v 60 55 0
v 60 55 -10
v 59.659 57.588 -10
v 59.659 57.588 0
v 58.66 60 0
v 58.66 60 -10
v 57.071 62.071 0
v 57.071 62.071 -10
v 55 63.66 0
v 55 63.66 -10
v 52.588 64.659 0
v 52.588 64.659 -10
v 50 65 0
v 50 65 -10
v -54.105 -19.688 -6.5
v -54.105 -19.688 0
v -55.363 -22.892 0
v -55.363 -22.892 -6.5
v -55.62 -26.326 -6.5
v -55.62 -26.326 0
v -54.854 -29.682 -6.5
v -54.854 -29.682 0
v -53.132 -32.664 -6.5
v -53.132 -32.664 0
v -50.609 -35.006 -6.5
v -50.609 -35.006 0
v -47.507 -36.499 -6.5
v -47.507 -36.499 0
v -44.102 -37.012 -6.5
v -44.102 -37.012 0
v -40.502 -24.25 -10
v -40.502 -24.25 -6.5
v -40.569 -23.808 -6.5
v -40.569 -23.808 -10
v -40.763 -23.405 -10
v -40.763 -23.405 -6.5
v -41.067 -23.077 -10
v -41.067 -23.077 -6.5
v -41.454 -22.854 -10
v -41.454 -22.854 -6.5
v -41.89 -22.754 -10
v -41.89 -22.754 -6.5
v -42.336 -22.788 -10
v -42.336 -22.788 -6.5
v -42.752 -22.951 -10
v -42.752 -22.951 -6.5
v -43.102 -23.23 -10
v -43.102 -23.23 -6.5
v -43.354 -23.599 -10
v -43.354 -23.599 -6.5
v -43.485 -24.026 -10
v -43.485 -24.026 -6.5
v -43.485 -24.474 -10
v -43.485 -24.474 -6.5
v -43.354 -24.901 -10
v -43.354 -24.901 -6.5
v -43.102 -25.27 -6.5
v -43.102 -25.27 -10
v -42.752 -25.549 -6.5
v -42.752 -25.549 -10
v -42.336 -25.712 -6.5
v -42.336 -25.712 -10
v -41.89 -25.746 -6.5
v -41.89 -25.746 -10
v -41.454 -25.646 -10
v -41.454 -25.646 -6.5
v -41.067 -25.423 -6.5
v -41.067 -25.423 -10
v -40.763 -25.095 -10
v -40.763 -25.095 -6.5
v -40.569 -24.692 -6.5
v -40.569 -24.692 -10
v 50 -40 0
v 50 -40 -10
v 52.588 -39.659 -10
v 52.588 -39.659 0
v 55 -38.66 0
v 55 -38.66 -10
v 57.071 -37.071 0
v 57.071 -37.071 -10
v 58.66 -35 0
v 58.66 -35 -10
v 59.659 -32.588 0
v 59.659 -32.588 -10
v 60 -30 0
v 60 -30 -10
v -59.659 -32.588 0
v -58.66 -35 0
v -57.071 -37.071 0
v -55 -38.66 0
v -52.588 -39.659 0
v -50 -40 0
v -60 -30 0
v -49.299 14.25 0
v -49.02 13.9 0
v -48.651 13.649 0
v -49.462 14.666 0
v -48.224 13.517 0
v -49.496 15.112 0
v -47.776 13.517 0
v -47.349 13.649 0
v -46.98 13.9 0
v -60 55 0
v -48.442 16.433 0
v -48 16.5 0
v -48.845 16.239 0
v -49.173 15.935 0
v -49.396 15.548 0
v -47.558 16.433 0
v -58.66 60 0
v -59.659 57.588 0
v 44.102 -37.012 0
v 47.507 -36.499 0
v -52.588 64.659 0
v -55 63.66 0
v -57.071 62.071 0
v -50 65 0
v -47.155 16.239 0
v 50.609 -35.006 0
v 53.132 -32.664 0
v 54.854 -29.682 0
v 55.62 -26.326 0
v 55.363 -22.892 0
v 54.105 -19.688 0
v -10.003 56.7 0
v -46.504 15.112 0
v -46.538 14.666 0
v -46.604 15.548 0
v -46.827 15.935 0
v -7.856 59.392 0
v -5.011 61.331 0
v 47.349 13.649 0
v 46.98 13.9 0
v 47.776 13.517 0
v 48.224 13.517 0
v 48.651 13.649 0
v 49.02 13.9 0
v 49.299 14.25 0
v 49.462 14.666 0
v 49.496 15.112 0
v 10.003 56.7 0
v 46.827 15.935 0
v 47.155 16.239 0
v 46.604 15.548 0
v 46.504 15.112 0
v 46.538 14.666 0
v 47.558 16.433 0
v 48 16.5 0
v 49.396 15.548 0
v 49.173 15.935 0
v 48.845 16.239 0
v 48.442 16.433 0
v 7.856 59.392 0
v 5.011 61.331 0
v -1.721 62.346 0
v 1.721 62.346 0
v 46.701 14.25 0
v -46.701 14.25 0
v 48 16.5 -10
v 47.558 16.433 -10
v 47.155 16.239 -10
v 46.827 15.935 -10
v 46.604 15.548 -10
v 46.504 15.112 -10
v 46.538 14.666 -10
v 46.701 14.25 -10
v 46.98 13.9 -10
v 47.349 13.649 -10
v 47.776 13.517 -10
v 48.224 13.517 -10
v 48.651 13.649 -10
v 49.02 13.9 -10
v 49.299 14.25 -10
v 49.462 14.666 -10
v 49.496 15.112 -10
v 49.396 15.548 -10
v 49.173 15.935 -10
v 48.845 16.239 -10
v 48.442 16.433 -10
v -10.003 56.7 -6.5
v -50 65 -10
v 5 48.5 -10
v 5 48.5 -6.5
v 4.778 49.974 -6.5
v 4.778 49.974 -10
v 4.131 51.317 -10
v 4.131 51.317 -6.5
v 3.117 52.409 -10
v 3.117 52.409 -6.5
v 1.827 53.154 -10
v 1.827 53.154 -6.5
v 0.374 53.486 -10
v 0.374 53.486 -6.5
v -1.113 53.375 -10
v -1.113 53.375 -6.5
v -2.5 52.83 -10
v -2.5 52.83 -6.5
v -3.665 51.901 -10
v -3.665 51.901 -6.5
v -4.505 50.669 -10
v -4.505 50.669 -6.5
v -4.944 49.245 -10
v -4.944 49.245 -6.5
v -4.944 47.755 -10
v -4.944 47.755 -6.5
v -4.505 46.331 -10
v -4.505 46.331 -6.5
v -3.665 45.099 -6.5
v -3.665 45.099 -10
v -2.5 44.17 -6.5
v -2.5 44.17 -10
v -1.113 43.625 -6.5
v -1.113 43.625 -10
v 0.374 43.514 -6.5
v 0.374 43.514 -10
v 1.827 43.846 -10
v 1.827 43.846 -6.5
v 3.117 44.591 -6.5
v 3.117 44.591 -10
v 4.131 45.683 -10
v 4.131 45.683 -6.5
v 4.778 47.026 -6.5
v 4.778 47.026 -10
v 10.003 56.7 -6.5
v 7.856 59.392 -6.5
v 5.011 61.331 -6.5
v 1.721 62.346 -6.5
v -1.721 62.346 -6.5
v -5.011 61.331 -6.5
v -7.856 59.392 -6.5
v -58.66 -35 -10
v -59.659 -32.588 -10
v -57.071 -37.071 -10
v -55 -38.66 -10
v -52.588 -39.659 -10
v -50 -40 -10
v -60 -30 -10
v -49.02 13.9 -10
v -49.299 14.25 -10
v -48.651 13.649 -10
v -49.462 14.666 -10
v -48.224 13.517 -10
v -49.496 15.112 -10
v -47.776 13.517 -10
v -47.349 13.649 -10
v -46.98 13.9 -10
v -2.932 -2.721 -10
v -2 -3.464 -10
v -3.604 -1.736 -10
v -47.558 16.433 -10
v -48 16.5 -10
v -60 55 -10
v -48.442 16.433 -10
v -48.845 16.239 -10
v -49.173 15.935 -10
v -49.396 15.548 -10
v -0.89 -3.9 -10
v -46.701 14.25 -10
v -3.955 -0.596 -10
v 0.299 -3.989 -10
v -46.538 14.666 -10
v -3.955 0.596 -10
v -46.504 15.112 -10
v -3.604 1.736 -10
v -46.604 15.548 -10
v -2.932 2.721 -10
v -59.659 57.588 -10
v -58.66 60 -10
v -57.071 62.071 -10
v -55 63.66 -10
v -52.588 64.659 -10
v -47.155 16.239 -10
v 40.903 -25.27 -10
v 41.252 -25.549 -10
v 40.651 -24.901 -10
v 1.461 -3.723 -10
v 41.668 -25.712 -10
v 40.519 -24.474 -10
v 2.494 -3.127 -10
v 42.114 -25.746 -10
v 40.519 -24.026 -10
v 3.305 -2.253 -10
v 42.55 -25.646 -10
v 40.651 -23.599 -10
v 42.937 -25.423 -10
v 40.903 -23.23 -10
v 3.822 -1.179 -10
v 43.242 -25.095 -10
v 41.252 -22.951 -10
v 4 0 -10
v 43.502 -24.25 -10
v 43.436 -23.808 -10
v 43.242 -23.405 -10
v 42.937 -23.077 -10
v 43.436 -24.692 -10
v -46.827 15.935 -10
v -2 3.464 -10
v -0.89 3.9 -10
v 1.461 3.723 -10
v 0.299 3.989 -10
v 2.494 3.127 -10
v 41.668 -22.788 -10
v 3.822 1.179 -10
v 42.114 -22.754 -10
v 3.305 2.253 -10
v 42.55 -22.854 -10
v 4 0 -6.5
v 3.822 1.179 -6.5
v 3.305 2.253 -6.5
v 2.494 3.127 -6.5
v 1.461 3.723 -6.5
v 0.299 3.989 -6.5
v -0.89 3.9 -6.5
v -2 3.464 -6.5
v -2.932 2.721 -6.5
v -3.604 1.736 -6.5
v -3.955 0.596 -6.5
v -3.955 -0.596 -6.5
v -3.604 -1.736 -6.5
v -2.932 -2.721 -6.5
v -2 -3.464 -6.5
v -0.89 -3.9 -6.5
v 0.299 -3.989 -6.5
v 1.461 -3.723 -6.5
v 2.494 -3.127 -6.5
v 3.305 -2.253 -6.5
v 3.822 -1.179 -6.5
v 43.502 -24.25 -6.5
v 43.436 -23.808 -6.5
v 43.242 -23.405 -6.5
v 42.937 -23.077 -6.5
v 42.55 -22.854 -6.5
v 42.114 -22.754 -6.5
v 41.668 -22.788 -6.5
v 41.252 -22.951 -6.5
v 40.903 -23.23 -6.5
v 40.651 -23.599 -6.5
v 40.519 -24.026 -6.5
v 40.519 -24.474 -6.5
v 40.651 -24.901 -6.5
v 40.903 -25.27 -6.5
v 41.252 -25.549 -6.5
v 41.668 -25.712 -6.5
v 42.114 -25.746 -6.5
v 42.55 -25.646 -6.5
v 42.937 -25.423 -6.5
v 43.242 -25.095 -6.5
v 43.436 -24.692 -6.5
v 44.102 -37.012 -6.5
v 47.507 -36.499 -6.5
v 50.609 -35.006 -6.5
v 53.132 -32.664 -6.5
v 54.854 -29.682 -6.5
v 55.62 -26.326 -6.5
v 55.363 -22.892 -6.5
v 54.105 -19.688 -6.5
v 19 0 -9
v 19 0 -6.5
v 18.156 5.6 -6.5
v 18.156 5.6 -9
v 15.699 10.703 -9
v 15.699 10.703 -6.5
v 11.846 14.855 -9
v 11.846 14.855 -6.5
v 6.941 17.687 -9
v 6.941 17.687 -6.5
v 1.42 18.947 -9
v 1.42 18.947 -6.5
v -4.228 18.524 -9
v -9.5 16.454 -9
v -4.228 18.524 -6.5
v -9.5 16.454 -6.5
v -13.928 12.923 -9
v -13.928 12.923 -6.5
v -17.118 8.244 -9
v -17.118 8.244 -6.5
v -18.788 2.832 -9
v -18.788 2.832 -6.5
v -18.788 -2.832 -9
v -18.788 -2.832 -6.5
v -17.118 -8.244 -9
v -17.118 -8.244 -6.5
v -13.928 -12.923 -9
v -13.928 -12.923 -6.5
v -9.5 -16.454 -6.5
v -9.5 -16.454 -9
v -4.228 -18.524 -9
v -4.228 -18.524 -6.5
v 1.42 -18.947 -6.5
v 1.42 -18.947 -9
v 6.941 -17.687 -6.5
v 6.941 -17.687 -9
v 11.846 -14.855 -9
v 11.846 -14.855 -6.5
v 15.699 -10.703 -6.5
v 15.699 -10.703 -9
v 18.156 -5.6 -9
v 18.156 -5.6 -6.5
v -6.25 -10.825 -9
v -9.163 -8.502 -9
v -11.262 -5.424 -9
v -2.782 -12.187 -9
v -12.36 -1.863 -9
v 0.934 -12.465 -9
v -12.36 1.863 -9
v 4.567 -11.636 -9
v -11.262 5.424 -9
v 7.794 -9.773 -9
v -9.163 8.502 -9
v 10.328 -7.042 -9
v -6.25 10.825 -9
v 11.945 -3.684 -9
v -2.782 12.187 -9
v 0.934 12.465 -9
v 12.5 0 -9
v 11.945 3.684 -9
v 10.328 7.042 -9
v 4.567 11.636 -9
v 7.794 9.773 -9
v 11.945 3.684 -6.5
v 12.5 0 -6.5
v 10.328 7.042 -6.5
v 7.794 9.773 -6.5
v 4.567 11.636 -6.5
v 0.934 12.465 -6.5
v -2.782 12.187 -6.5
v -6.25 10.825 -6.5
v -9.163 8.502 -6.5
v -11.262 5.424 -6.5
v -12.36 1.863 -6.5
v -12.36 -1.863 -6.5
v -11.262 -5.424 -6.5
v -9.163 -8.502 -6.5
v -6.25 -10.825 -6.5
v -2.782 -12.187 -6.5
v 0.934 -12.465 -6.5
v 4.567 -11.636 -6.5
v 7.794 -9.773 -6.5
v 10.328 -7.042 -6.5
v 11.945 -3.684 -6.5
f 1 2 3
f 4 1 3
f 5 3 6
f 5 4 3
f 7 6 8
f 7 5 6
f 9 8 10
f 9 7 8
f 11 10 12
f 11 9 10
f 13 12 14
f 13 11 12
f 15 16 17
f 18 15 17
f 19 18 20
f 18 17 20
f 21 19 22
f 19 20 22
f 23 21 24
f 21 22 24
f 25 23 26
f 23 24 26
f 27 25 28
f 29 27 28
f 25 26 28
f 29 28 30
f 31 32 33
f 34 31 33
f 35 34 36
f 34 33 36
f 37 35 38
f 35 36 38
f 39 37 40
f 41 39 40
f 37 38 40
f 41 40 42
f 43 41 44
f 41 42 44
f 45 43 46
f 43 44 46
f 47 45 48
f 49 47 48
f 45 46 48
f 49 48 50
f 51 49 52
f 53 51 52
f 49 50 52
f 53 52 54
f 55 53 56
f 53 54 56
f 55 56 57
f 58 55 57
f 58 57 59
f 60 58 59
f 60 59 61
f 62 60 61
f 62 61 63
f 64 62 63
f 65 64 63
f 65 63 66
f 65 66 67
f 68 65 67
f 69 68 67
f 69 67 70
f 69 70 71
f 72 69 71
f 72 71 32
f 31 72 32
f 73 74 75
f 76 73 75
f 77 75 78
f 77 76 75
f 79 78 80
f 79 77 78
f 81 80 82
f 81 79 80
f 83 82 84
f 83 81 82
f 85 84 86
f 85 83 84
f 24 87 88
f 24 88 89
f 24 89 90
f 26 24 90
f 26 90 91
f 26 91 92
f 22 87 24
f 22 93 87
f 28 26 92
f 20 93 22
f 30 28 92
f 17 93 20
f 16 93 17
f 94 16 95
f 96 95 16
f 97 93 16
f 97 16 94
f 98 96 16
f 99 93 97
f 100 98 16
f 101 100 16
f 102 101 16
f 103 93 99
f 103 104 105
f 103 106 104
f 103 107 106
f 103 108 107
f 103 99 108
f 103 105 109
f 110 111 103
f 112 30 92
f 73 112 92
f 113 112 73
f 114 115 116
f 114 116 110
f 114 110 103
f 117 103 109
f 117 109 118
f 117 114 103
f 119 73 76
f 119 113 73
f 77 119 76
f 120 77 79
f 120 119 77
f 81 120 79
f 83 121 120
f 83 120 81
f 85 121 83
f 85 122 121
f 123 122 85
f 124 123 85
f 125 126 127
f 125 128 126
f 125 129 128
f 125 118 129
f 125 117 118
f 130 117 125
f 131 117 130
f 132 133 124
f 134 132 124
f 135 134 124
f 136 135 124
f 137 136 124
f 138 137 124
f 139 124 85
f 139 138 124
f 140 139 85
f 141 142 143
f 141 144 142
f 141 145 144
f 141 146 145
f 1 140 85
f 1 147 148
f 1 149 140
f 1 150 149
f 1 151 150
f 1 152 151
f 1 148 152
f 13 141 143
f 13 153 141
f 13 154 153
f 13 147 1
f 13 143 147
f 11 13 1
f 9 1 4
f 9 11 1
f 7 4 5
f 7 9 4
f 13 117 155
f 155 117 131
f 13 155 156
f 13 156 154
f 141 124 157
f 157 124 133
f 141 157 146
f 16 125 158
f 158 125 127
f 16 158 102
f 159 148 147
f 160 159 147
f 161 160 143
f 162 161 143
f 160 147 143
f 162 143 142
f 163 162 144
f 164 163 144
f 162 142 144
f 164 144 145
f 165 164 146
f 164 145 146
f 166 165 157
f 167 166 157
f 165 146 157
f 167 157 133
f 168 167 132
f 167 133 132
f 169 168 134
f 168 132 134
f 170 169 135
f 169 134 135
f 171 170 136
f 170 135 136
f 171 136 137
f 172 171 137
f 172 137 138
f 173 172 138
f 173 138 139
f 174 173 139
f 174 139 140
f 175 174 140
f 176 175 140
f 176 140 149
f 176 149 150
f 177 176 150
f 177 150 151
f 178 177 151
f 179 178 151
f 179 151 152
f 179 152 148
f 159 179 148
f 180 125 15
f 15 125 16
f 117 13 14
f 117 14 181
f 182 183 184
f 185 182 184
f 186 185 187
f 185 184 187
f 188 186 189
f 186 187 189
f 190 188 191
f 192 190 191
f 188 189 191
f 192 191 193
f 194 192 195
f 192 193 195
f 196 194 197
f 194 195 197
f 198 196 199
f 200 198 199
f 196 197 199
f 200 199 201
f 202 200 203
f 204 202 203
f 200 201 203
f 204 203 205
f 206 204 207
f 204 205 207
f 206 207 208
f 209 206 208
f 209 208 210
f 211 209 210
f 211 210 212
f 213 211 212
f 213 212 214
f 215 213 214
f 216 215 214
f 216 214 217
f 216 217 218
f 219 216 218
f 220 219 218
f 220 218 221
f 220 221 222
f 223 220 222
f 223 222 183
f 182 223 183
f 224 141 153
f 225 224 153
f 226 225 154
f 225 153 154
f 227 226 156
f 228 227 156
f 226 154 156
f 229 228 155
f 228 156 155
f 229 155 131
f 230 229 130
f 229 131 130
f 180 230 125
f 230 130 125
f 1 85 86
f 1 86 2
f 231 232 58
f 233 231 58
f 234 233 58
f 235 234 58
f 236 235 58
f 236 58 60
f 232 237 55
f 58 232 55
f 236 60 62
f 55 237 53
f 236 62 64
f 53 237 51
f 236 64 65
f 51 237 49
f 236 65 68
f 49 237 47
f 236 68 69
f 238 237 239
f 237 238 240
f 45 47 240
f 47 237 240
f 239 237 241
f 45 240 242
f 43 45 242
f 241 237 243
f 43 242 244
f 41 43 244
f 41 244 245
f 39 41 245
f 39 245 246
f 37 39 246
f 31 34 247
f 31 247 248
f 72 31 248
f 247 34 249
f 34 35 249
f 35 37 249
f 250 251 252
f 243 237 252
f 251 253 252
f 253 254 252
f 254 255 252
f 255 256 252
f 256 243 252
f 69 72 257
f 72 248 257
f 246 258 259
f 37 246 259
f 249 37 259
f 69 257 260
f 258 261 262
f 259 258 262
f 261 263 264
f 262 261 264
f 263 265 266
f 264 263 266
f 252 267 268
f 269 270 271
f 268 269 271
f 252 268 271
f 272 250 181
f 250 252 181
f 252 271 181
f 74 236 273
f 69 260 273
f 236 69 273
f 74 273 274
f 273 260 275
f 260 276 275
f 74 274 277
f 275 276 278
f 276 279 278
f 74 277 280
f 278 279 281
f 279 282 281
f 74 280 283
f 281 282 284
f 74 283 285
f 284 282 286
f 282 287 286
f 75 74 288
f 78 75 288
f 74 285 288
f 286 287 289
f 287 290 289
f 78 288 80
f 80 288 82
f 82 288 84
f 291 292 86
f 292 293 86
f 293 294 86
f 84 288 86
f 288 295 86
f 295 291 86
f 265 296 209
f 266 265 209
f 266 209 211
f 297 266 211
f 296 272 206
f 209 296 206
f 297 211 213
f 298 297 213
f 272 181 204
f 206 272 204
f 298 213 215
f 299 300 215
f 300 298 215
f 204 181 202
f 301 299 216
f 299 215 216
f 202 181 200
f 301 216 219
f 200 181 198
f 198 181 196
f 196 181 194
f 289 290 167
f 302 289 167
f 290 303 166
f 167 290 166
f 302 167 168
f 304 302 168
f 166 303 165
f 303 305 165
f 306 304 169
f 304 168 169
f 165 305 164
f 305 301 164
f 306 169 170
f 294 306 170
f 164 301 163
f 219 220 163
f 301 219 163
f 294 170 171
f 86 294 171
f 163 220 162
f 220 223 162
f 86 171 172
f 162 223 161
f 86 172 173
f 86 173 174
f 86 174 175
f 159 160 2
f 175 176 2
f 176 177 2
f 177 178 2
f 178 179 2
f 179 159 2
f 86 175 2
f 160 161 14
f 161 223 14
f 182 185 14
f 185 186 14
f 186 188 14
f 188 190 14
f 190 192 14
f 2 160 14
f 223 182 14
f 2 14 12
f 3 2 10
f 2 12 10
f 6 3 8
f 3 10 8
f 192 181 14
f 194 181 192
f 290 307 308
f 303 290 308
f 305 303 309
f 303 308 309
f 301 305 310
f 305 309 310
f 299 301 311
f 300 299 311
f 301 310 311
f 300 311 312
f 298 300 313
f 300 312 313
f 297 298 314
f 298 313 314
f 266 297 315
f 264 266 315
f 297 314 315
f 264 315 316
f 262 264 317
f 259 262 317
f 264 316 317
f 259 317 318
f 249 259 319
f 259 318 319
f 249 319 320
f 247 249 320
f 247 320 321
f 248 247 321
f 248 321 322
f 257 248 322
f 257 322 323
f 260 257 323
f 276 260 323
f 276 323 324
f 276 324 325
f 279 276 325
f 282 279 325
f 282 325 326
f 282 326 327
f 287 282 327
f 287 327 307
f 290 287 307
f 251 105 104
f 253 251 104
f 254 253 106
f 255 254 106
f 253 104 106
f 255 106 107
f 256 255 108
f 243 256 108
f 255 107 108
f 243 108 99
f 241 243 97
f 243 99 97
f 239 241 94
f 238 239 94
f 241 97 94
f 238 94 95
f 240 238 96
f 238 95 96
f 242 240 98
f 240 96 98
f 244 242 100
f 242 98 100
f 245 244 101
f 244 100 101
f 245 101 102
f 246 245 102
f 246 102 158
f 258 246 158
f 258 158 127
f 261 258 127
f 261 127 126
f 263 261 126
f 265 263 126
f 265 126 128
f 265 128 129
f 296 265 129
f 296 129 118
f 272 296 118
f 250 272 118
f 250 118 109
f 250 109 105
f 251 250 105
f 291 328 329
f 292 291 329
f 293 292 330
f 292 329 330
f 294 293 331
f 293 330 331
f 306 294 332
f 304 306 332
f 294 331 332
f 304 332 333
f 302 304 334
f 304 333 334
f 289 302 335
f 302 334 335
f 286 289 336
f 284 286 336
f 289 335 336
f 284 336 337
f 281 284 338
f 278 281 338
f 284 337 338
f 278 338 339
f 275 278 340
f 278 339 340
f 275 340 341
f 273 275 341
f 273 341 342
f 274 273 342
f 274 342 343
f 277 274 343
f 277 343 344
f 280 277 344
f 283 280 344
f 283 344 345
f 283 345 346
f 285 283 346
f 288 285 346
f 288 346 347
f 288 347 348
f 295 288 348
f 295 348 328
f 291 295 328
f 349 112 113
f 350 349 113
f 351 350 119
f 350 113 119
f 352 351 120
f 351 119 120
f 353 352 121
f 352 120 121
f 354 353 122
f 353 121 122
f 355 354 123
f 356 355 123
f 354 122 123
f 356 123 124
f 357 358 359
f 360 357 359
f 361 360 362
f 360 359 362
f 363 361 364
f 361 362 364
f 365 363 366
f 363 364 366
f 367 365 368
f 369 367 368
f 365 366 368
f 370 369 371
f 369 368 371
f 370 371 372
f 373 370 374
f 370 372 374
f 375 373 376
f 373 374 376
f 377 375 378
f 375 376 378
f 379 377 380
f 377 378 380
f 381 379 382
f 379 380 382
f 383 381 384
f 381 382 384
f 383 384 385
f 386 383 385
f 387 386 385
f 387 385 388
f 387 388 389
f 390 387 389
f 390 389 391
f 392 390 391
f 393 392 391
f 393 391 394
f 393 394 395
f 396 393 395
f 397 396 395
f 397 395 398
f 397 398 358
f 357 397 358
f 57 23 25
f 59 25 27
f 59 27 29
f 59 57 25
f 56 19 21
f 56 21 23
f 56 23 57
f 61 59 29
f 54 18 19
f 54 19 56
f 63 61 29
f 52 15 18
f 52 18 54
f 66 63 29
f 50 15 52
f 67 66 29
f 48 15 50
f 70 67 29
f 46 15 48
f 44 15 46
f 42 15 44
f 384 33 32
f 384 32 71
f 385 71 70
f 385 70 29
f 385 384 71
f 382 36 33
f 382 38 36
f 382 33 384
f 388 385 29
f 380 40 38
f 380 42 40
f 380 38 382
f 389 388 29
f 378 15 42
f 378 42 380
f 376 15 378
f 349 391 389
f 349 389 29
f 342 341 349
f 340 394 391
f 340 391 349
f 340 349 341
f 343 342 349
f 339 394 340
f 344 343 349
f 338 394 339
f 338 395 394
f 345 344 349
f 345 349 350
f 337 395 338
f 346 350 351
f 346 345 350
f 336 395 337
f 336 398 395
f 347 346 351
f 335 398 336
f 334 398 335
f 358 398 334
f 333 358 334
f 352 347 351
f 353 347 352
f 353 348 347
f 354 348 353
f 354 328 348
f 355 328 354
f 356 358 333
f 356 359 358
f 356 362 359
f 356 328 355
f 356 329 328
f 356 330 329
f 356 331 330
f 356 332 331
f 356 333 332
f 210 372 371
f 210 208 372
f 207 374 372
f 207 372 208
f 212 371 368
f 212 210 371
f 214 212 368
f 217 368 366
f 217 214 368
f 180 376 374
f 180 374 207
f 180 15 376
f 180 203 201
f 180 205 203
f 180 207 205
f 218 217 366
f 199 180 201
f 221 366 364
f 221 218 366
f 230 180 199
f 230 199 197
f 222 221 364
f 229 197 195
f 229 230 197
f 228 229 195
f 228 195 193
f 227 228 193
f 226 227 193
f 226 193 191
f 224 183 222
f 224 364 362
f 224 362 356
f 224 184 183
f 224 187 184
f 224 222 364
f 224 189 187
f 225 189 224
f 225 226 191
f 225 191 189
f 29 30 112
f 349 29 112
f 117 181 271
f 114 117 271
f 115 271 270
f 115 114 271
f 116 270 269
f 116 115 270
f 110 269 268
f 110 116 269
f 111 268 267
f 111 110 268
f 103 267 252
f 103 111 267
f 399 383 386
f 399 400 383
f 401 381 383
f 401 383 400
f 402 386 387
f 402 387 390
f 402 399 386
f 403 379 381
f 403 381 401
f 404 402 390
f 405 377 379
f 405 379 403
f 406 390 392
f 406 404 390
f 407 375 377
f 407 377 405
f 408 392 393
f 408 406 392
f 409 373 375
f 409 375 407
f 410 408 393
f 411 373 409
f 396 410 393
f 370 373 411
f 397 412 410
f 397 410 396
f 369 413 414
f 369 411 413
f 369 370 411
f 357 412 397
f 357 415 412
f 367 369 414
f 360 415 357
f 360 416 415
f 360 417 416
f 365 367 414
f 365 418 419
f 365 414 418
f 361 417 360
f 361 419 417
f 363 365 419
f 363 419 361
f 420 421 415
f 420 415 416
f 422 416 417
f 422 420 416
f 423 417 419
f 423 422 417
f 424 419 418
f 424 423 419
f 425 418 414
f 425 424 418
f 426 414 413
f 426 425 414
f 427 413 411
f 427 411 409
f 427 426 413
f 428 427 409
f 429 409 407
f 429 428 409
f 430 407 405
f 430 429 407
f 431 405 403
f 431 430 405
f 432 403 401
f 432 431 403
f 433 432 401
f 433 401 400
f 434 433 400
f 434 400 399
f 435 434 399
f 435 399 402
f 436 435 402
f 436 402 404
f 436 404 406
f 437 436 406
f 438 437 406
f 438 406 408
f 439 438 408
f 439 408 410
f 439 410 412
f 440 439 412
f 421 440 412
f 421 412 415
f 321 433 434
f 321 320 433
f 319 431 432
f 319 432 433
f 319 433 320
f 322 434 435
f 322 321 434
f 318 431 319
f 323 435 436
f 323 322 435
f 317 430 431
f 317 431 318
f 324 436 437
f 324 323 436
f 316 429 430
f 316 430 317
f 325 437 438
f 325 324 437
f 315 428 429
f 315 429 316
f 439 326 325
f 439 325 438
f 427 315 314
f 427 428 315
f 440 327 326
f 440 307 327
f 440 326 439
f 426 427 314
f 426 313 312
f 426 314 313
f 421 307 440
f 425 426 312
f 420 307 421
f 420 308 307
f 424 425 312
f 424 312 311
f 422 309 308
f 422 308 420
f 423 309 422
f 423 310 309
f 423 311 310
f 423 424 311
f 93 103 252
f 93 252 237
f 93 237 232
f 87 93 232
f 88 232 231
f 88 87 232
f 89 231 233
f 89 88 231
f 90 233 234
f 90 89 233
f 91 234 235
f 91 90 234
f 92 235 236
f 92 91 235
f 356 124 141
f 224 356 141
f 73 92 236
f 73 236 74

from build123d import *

# Parameters (mm, degrees)
PAD_DEPTH       = 10
SKETCH_R        = 1.5
SKETCH_R_2      = 5
SKETCH_R_3      = 4
POCKET_DEPTH    = 10.001
POCKET001_DEPTH = 6.5
SKETCH006_R     = 19
SKETCH006_R_2   = 12.5
POCKET002_DEPTH = 9
SHAPEBINDER_R   = 1.5
POCKET003_DEPTH = 10.001


with BuildPart() as part:
    # Clone2D → Pad (new body)
    with BuildSketch(Plane.XY):
        with BuildLine():
            Line((-50, -40), (50, -40))
            ThreePointArc((50, -40), (57.071068, -37.071068), (60, -30))
            Line((60, -30), (60, 55))
            ThreePointArc((60, 55), (57.071068, 62.071068), (50, 65))
            Line((50, 65), (-50, 65))
            ThreePointArc((-50, 65), (-57.071068, 62.071068), (-60, 55))
            Line((-60, 55), (-60, -30))
            ThreePointArc((-60, -30), (-57.071068, -37.071068), (-50, -40))
        make_face()
    extrude(amount=-PAD_DEPTH)

    # Sketch → Pocket (cut, through all)
    with BuildSketch(Plane.XY):
        with Locations((-42.002232, -24.25)):
            Circle(SKETCH_R)
        with Locations((42.002232, -24.25)):
            Circle(SKETCH_R)
        with Locations((0, 48.5)):
            Circle(SKETCH_R_2)
        Circle(SKETCH_R_3)
    extrude(amount=-POCKET_DEPTH, mode=Mode.SUBTRACT)

    # Clone2D002 → Pocket001 (cut)
    with BuildSketch(Plane.XY):
        with BuildLine():
            ThreePointArc((10.002593, 56.7), (0, 62.475), (-10.002593, 56.7))
            Line((-10.002593, 56.7), (-54.104937, -19.6875))
            ThreePointArc((-54.104937, -19.6875), (-54.104937, -31.2375), (-44.102344, -37.0125))
            Line((-44.102344, -37.0125), (44.102344, -37.0125))
            ThreePointArc((44.102344, -37.0125), (54.104937, -31.2375), (54.104937, -19.6875))
            Line((54.104937, -19.6875), (10.002593, 56.7))
        make_face()
    extrude(amount=-POCKET001_DEPTH, mode=Mode.SUBTRACT)

    # Sketch006 → Pocket002 (cut)
    with BuildSketch(Plane.XY):
        Circle(SKETCH006_R)
        Circle(SKETCH006_R_2, mode=Mode.SUBTRACT)
    extrude(amount=-POCKET002_DEPTH, mode=Mode.SUBTRACT)

    # ShapeBinder → Pocket003 (cut, through all)
    with BuildSketch(Plane(origin=(0, 15, 0), x_dir=(0, 1, 0), z_dir=(0, 0, 1))):
        with Locations((0, 48)):
            Circle(SHAPEBINDER_R)
        with Locations((0, -48)):
            Circle(SHAPEBINDER_R)
    extrude(amount=-POCKET003_DEPTH, mode=Mode.SUBTRACT)


solid = part.part
